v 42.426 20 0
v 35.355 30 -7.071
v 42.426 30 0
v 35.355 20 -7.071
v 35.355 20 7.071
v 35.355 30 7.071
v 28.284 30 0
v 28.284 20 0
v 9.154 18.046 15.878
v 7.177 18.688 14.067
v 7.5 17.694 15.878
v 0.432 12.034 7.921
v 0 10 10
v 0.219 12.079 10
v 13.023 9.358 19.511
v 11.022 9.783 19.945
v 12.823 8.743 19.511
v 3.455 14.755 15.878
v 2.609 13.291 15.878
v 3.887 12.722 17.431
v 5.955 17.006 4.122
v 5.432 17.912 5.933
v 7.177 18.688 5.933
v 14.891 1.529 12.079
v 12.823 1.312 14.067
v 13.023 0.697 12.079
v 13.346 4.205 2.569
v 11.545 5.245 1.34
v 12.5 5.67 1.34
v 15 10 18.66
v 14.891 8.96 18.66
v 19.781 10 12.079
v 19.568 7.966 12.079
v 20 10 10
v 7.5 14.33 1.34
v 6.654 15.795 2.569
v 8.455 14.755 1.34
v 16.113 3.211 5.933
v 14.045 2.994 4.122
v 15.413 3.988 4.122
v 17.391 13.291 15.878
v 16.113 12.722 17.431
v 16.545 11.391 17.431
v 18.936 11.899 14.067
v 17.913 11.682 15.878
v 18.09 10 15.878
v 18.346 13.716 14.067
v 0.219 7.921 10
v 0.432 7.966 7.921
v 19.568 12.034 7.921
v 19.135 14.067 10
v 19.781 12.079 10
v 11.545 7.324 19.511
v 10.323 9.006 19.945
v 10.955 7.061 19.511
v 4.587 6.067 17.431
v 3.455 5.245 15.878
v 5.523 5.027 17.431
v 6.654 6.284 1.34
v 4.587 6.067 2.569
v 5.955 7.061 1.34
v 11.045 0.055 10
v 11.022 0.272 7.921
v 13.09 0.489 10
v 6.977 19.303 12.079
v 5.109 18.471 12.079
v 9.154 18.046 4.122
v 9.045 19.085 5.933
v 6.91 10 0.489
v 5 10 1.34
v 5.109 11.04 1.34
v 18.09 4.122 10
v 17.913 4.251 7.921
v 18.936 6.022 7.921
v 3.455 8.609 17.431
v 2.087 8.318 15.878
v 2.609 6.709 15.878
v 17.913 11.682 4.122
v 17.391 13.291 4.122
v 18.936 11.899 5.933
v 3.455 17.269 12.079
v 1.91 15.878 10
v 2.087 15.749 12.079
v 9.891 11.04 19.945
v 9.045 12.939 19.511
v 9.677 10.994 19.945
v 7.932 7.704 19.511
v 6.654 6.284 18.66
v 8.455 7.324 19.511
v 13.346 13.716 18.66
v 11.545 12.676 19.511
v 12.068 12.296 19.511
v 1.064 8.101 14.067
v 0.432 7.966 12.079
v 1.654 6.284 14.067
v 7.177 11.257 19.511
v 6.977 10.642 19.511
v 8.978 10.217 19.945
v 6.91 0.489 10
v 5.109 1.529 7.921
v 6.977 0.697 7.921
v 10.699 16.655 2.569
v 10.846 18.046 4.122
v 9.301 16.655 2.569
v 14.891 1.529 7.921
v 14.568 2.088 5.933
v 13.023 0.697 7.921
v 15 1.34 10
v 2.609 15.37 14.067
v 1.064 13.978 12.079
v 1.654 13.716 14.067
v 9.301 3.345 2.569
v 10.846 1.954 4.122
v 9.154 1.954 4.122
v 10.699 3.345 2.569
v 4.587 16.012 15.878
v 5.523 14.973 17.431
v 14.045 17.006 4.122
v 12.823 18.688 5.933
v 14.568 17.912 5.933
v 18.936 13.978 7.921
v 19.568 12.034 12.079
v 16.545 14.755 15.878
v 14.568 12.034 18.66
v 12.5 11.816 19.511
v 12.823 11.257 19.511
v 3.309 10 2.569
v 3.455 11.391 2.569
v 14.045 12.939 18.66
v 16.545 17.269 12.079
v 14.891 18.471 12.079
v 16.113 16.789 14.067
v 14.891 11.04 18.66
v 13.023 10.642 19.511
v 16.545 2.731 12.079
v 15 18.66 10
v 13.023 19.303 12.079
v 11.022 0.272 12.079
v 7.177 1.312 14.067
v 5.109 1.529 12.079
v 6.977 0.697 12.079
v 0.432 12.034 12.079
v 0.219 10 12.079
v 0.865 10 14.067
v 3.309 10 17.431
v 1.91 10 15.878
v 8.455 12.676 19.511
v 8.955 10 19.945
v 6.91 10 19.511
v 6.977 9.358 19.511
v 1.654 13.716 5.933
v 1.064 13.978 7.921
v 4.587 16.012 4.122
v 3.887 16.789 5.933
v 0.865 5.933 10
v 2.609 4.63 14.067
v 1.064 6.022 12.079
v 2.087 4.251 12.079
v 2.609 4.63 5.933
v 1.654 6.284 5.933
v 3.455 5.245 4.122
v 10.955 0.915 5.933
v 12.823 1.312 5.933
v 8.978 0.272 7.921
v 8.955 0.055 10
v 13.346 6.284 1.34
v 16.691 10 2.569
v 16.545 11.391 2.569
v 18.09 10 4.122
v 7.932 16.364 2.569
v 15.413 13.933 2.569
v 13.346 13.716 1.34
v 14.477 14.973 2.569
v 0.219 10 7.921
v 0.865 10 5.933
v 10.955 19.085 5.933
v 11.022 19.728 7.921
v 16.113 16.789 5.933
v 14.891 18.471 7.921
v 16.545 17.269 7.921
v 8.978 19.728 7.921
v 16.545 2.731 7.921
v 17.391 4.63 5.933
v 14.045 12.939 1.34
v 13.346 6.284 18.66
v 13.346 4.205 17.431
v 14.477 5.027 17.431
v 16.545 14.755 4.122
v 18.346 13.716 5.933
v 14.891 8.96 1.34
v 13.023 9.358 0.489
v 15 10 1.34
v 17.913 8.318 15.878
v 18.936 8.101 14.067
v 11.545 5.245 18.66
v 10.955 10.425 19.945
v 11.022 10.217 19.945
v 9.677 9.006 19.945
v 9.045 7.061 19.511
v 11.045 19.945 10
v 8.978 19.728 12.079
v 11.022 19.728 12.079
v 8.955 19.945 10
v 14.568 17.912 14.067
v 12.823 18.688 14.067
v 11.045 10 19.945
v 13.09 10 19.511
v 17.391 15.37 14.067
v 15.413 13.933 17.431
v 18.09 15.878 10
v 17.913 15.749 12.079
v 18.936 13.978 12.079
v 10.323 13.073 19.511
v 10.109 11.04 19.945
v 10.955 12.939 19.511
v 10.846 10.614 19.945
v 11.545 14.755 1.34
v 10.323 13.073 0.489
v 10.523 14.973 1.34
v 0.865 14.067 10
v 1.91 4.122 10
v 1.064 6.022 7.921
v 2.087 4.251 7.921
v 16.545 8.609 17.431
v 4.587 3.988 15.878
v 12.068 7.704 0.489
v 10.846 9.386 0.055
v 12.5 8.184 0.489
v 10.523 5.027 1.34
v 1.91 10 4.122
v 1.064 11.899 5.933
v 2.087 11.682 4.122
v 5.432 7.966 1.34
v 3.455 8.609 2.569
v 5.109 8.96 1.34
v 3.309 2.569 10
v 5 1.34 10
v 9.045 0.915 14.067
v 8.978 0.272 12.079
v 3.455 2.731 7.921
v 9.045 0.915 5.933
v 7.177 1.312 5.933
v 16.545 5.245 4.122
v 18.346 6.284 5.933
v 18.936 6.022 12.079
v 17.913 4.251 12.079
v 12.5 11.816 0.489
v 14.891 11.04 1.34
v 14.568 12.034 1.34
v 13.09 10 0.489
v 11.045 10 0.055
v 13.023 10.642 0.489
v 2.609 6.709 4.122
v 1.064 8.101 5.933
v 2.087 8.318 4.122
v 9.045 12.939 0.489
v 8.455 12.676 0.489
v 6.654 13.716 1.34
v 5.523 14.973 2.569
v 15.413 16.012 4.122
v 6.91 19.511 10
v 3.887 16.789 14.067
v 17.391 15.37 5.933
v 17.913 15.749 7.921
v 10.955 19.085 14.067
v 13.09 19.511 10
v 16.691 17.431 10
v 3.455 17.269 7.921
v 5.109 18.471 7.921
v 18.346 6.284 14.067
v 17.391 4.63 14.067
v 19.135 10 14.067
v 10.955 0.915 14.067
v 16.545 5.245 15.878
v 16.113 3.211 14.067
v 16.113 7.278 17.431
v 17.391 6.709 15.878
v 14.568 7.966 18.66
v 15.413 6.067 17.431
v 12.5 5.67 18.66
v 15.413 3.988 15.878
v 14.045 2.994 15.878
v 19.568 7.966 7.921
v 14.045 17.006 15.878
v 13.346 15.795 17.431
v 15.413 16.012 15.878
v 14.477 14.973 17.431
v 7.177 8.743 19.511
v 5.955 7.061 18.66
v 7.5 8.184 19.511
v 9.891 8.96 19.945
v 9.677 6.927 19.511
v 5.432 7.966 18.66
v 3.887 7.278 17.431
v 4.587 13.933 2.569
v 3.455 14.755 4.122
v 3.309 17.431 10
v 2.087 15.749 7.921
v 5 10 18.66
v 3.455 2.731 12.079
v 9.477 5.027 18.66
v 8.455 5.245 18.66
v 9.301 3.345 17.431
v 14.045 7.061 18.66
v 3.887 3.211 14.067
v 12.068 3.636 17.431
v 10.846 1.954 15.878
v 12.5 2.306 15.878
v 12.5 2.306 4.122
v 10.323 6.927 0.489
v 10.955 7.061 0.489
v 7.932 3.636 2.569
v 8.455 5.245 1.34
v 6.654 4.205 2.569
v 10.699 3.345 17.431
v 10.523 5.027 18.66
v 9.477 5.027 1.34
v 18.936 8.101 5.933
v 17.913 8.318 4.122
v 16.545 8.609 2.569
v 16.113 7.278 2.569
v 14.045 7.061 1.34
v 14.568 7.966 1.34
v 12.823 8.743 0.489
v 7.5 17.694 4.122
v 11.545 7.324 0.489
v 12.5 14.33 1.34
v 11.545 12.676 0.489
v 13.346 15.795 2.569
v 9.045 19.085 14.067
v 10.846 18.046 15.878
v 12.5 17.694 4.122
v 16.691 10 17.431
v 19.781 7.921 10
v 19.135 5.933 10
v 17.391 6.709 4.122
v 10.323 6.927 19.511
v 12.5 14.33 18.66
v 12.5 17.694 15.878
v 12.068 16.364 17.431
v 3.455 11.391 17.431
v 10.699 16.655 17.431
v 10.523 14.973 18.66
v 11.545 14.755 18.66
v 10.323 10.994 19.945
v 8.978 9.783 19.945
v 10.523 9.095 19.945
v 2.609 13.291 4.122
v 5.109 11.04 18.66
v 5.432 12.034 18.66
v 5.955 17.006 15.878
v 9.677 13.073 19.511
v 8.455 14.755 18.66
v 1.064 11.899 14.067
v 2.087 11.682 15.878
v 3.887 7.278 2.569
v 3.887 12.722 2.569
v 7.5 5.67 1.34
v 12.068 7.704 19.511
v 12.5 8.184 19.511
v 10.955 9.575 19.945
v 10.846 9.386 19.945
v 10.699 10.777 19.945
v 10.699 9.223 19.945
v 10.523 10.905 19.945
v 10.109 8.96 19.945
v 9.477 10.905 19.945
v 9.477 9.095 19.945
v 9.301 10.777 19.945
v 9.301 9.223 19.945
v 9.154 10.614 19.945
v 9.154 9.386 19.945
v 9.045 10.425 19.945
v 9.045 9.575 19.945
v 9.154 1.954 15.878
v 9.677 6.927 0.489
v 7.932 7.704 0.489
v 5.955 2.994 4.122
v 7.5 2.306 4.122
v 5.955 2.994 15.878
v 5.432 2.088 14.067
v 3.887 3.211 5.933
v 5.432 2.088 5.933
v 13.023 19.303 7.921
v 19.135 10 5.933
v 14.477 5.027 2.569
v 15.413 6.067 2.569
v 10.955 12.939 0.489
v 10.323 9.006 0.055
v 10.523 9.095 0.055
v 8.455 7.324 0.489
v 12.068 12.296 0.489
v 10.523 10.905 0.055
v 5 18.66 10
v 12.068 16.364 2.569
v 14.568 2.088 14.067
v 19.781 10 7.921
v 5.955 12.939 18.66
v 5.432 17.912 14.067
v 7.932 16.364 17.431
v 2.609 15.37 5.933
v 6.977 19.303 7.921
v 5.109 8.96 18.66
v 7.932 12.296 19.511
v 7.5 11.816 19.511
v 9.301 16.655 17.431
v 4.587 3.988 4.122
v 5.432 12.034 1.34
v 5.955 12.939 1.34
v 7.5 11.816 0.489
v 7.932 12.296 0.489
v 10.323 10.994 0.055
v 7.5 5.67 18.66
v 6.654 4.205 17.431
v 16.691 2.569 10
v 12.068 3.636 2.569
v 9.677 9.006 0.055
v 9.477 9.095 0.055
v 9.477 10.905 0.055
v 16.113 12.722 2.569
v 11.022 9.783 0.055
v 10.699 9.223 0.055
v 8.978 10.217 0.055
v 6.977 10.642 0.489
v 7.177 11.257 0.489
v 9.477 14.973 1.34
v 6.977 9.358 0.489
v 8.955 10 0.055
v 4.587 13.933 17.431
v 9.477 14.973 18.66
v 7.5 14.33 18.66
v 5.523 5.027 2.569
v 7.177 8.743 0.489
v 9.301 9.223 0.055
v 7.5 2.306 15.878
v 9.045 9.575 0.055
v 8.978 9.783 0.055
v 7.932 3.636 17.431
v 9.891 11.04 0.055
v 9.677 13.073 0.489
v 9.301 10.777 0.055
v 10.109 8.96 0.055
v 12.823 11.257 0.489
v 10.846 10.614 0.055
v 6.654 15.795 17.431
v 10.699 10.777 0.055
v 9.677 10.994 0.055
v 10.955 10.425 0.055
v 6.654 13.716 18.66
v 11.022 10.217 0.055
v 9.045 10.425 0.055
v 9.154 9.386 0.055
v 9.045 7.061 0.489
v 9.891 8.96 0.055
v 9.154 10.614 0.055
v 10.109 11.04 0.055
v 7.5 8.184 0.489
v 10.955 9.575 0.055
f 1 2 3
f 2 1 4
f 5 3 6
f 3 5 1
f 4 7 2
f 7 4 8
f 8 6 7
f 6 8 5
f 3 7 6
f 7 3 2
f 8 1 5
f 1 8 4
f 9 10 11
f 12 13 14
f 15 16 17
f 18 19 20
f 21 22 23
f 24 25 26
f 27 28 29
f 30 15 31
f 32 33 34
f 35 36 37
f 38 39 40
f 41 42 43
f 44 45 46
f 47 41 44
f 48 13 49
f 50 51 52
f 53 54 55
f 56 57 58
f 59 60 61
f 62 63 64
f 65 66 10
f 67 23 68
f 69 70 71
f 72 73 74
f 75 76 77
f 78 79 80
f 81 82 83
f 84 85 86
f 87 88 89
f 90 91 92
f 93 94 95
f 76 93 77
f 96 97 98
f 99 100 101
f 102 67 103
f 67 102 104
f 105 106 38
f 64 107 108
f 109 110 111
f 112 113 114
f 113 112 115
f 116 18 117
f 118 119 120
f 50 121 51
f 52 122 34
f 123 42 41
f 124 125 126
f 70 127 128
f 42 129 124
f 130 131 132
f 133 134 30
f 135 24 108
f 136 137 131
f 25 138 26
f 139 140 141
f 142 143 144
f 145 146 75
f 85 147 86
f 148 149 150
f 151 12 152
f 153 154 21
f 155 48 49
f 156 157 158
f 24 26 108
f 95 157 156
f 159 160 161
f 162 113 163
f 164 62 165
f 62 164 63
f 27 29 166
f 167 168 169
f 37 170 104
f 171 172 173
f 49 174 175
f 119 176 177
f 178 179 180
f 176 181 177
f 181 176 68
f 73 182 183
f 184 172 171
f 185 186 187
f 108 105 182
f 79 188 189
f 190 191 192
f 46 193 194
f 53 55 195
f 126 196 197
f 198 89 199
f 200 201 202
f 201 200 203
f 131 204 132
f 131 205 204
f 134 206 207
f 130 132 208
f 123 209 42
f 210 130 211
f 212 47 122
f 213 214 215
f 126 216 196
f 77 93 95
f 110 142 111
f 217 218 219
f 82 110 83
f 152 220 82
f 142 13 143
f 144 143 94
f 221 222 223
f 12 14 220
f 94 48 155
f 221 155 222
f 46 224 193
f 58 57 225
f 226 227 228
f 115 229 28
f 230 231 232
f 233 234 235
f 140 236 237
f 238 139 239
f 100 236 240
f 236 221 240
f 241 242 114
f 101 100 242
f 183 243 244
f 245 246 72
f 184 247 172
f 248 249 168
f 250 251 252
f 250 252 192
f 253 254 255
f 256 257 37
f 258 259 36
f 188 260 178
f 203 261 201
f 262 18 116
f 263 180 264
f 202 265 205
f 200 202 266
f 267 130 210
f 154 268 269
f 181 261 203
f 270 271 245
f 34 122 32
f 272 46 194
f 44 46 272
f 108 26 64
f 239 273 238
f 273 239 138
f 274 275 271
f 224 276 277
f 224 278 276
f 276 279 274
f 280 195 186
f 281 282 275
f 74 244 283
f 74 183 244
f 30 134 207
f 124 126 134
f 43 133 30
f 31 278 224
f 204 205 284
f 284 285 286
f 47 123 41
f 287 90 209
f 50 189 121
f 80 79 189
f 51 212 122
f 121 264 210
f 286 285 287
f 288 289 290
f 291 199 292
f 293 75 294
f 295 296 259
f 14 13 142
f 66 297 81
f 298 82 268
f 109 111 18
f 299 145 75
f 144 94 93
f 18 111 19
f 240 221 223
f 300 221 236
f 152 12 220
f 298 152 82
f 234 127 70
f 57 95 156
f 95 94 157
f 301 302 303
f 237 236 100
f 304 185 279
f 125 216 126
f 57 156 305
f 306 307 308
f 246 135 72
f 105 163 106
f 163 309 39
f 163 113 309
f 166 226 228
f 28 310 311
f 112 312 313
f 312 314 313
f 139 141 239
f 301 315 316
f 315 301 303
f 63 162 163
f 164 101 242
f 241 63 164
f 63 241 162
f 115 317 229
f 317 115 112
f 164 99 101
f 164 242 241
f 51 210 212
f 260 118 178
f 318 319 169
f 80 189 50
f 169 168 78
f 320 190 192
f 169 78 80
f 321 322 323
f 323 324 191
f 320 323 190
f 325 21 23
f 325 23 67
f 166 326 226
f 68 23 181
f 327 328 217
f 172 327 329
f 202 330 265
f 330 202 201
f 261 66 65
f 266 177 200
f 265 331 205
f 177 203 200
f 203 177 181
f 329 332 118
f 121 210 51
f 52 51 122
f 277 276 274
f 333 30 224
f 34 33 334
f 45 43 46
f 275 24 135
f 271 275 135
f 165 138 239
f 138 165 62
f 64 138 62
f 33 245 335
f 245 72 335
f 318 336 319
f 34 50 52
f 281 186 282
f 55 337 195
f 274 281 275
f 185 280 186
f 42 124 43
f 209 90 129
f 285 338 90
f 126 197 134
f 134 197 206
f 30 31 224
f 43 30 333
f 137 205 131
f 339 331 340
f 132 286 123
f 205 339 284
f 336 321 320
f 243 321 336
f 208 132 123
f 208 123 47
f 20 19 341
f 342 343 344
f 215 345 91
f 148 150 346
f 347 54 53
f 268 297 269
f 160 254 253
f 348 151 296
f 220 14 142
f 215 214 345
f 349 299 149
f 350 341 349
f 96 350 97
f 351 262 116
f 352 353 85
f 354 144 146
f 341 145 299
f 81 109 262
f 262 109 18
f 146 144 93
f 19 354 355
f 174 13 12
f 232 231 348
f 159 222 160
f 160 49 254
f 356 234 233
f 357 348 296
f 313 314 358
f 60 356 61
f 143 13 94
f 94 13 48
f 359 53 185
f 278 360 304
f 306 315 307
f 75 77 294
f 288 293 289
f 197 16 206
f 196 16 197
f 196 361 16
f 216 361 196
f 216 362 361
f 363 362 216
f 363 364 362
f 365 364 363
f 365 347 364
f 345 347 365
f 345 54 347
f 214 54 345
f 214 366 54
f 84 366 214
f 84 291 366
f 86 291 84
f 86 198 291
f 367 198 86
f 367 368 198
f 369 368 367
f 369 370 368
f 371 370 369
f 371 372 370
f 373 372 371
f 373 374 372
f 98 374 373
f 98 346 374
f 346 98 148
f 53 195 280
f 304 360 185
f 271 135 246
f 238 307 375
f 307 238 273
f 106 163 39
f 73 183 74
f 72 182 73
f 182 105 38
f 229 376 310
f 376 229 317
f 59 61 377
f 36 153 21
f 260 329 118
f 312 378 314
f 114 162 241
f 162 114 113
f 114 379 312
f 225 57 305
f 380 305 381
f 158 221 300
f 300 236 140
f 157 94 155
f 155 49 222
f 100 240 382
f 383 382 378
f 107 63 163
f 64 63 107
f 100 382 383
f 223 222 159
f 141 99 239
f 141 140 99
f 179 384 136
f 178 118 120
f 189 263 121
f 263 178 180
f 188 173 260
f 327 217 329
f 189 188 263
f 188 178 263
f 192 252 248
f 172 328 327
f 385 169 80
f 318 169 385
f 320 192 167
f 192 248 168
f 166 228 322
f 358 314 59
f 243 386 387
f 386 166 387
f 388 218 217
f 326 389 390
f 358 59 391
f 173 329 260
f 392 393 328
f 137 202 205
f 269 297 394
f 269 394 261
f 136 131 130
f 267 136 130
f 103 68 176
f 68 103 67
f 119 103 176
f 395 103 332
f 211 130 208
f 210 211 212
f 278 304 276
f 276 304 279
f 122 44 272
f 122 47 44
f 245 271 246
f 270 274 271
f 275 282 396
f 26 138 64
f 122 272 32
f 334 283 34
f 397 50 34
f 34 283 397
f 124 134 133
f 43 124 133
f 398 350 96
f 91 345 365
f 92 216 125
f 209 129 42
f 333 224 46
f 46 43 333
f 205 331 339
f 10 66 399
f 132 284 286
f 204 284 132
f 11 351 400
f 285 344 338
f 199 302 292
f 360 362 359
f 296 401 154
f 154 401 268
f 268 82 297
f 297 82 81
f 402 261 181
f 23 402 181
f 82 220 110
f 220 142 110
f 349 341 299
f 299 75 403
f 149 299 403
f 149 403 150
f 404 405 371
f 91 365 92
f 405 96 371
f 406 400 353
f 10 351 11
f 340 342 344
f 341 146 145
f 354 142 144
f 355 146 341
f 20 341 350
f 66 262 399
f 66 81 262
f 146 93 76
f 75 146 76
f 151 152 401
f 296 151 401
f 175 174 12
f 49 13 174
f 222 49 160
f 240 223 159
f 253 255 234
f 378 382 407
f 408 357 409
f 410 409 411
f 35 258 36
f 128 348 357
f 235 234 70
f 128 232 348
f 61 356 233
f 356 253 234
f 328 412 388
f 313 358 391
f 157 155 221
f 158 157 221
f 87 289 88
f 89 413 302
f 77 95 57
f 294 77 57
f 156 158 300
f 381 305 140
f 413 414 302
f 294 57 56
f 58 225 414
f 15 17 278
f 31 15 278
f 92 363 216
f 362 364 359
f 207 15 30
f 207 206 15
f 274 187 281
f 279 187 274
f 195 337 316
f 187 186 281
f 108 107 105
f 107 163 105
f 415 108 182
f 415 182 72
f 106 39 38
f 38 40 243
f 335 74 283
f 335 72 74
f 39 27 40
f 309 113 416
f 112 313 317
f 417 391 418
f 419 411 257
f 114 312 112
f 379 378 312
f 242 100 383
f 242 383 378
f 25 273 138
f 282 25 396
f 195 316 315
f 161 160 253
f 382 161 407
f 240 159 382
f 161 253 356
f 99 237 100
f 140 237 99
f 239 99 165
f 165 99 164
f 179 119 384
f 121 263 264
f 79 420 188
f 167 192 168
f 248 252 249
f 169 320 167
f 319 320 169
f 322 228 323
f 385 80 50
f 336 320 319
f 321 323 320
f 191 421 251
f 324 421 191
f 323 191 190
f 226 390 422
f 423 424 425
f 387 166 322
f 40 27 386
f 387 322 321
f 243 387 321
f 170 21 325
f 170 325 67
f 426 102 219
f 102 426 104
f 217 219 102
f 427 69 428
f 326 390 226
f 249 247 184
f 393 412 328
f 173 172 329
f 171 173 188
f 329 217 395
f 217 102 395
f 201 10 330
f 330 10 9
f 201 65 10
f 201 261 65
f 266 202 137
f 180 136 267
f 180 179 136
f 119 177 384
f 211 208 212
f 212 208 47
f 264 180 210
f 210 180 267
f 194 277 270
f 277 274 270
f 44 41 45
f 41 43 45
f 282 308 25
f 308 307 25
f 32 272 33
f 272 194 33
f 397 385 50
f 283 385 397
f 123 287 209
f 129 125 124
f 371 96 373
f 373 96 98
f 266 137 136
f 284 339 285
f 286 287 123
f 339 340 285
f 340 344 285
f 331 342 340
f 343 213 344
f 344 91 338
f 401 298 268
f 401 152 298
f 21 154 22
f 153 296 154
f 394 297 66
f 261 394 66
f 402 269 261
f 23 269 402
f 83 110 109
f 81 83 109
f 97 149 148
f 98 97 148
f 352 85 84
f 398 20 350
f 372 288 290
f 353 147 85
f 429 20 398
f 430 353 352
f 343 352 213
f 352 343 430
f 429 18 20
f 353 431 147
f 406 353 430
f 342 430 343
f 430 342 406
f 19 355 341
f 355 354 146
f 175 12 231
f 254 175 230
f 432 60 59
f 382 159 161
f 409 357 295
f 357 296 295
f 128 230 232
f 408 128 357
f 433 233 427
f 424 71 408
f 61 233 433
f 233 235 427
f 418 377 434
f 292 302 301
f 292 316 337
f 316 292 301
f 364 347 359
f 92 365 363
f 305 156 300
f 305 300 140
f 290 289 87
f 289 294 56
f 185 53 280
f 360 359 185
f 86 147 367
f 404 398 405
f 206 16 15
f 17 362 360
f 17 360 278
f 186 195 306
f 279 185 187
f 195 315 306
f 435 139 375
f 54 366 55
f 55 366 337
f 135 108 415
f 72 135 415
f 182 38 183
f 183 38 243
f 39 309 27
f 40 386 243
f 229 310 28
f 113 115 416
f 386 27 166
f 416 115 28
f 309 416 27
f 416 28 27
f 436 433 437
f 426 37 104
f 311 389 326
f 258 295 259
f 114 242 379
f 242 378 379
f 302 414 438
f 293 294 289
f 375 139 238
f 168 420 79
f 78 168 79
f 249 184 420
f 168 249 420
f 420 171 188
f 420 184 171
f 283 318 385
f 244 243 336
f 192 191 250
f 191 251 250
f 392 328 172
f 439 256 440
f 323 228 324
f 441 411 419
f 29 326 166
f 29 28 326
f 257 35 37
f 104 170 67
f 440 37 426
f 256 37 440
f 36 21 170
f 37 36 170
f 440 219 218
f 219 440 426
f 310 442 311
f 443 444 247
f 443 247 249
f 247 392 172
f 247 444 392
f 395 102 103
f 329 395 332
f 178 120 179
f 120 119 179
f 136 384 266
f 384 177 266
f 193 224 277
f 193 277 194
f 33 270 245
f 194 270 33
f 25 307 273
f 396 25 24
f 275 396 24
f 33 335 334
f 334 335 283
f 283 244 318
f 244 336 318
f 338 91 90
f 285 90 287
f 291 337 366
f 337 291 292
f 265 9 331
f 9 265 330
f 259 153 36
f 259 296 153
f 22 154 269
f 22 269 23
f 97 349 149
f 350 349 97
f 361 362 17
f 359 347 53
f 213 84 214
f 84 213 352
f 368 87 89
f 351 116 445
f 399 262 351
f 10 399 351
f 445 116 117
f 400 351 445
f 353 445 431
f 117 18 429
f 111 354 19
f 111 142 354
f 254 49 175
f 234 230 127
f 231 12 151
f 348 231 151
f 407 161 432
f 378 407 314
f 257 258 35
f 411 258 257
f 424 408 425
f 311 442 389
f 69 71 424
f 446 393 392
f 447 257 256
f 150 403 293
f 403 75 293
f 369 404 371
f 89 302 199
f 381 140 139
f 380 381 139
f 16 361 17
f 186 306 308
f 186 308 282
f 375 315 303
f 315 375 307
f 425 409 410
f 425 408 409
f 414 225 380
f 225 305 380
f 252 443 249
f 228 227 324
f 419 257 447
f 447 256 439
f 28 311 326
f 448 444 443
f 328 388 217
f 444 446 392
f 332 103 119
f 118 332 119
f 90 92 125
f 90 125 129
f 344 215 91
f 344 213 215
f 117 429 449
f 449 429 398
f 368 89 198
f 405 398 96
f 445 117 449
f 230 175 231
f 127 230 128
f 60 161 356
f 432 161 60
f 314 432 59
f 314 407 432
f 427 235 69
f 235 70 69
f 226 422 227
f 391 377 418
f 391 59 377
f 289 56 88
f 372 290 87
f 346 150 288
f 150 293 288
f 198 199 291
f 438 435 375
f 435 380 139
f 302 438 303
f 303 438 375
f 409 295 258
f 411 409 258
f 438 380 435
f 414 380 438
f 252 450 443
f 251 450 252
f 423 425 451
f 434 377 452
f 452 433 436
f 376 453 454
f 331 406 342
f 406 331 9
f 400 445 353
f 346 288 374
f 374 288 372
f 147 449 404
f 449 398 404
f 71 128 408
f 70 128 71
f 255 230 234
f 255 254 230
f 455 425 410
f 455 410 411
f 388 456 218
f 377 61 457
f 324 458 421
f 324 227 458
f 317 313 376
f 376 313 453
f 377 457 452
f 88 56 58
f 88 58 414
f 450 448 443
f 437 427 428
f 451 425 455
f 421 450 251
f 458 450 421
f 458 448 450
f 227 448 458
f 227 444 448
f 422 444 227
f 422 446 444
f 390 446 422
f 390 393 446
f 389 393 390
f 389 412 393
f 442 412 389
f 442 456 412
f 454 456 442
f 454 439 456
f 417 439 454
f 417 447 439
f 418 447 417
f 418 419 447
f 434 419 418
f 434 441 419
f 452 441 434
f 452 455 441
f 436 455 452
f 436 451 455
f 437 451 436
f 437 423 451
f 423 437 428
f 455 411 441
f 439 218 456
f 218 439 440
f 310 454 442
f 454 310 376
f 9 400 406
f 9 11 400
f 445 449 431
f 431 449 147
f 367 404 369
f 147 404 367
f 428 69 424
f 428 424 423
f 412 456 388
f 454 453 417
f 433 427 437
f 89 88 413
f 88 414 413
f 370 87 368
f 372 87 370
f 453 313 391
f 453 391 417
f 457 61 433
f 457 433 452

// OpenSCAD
render()
color("red")
rotate([0, 45, 0])
translate([20, 20, 20])
cube([10, 10, 10]);

translate([10, 10, 10]) {
    color("green")
    sphere(r = 10);
}
